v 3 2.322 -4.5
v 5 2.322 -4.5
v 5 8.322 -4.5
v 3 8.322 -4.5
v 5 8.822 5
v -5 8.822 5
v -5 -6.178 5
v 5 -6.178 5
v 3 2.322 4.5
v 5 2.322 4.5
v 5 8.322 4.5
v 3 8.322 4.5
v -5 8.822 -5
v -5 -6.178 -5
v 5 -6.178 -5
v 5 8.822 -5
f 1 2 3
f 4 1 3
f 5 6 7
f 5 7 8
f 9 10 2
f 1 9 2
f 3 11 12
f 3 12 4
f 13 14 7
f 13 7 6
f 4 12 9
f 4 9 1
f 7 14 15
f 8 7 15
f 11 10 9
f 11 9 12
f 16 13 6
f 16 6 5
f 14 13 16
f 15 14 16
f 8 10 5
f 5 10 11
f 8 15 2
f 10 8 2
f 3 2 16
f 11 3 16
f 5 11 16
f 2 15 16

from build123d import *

# Parameters (mm, degrees)
BOSS_EXTRUDE1_DEPTH      = 5
BOSS_EXTRUDE1_DEPTH_BACK = 5
SKETCH1_W                = 10
SKETCH1_H                = 15
SKETCH3_W                = 9
SKETCH3_H                = 6
CUT_EXTRUDE2_DEPTH       = 2


with BuildPart() as part:
    # Sketch1 → Boss-Extrude1 (new, two sides: drawn at the far end of the back side and taken through both)
    with BuildSketch(Plane.XY.offset(-BOSS_EXTRUDE1_DEPTH_BACK)):
        with Locations((0, 1.32209169)):
            Rectangle(SKETCH1_W, SKETCH1_H)
    extrude(amount=BOSS_EXTRUDE1_DEPTH + BOSS_EXTRUDE1_DEPTH_BACK)

    # Sketch3 → Cut-Extrude2 (cut)
    with BuildSketch(Plane(origin=(5, 0, 0), x_dir=(0, 0, -1), z_dir=(1, 0, 0))):
        with Locations((0, 5.32209169)):
            Rectangle(SKETCH3_W, SKETCH3_H)
    extrude(amount=-CUT_EXTRUDE2_DEPTH, mode=Mode.SUBTRACT)


solid = part.part
